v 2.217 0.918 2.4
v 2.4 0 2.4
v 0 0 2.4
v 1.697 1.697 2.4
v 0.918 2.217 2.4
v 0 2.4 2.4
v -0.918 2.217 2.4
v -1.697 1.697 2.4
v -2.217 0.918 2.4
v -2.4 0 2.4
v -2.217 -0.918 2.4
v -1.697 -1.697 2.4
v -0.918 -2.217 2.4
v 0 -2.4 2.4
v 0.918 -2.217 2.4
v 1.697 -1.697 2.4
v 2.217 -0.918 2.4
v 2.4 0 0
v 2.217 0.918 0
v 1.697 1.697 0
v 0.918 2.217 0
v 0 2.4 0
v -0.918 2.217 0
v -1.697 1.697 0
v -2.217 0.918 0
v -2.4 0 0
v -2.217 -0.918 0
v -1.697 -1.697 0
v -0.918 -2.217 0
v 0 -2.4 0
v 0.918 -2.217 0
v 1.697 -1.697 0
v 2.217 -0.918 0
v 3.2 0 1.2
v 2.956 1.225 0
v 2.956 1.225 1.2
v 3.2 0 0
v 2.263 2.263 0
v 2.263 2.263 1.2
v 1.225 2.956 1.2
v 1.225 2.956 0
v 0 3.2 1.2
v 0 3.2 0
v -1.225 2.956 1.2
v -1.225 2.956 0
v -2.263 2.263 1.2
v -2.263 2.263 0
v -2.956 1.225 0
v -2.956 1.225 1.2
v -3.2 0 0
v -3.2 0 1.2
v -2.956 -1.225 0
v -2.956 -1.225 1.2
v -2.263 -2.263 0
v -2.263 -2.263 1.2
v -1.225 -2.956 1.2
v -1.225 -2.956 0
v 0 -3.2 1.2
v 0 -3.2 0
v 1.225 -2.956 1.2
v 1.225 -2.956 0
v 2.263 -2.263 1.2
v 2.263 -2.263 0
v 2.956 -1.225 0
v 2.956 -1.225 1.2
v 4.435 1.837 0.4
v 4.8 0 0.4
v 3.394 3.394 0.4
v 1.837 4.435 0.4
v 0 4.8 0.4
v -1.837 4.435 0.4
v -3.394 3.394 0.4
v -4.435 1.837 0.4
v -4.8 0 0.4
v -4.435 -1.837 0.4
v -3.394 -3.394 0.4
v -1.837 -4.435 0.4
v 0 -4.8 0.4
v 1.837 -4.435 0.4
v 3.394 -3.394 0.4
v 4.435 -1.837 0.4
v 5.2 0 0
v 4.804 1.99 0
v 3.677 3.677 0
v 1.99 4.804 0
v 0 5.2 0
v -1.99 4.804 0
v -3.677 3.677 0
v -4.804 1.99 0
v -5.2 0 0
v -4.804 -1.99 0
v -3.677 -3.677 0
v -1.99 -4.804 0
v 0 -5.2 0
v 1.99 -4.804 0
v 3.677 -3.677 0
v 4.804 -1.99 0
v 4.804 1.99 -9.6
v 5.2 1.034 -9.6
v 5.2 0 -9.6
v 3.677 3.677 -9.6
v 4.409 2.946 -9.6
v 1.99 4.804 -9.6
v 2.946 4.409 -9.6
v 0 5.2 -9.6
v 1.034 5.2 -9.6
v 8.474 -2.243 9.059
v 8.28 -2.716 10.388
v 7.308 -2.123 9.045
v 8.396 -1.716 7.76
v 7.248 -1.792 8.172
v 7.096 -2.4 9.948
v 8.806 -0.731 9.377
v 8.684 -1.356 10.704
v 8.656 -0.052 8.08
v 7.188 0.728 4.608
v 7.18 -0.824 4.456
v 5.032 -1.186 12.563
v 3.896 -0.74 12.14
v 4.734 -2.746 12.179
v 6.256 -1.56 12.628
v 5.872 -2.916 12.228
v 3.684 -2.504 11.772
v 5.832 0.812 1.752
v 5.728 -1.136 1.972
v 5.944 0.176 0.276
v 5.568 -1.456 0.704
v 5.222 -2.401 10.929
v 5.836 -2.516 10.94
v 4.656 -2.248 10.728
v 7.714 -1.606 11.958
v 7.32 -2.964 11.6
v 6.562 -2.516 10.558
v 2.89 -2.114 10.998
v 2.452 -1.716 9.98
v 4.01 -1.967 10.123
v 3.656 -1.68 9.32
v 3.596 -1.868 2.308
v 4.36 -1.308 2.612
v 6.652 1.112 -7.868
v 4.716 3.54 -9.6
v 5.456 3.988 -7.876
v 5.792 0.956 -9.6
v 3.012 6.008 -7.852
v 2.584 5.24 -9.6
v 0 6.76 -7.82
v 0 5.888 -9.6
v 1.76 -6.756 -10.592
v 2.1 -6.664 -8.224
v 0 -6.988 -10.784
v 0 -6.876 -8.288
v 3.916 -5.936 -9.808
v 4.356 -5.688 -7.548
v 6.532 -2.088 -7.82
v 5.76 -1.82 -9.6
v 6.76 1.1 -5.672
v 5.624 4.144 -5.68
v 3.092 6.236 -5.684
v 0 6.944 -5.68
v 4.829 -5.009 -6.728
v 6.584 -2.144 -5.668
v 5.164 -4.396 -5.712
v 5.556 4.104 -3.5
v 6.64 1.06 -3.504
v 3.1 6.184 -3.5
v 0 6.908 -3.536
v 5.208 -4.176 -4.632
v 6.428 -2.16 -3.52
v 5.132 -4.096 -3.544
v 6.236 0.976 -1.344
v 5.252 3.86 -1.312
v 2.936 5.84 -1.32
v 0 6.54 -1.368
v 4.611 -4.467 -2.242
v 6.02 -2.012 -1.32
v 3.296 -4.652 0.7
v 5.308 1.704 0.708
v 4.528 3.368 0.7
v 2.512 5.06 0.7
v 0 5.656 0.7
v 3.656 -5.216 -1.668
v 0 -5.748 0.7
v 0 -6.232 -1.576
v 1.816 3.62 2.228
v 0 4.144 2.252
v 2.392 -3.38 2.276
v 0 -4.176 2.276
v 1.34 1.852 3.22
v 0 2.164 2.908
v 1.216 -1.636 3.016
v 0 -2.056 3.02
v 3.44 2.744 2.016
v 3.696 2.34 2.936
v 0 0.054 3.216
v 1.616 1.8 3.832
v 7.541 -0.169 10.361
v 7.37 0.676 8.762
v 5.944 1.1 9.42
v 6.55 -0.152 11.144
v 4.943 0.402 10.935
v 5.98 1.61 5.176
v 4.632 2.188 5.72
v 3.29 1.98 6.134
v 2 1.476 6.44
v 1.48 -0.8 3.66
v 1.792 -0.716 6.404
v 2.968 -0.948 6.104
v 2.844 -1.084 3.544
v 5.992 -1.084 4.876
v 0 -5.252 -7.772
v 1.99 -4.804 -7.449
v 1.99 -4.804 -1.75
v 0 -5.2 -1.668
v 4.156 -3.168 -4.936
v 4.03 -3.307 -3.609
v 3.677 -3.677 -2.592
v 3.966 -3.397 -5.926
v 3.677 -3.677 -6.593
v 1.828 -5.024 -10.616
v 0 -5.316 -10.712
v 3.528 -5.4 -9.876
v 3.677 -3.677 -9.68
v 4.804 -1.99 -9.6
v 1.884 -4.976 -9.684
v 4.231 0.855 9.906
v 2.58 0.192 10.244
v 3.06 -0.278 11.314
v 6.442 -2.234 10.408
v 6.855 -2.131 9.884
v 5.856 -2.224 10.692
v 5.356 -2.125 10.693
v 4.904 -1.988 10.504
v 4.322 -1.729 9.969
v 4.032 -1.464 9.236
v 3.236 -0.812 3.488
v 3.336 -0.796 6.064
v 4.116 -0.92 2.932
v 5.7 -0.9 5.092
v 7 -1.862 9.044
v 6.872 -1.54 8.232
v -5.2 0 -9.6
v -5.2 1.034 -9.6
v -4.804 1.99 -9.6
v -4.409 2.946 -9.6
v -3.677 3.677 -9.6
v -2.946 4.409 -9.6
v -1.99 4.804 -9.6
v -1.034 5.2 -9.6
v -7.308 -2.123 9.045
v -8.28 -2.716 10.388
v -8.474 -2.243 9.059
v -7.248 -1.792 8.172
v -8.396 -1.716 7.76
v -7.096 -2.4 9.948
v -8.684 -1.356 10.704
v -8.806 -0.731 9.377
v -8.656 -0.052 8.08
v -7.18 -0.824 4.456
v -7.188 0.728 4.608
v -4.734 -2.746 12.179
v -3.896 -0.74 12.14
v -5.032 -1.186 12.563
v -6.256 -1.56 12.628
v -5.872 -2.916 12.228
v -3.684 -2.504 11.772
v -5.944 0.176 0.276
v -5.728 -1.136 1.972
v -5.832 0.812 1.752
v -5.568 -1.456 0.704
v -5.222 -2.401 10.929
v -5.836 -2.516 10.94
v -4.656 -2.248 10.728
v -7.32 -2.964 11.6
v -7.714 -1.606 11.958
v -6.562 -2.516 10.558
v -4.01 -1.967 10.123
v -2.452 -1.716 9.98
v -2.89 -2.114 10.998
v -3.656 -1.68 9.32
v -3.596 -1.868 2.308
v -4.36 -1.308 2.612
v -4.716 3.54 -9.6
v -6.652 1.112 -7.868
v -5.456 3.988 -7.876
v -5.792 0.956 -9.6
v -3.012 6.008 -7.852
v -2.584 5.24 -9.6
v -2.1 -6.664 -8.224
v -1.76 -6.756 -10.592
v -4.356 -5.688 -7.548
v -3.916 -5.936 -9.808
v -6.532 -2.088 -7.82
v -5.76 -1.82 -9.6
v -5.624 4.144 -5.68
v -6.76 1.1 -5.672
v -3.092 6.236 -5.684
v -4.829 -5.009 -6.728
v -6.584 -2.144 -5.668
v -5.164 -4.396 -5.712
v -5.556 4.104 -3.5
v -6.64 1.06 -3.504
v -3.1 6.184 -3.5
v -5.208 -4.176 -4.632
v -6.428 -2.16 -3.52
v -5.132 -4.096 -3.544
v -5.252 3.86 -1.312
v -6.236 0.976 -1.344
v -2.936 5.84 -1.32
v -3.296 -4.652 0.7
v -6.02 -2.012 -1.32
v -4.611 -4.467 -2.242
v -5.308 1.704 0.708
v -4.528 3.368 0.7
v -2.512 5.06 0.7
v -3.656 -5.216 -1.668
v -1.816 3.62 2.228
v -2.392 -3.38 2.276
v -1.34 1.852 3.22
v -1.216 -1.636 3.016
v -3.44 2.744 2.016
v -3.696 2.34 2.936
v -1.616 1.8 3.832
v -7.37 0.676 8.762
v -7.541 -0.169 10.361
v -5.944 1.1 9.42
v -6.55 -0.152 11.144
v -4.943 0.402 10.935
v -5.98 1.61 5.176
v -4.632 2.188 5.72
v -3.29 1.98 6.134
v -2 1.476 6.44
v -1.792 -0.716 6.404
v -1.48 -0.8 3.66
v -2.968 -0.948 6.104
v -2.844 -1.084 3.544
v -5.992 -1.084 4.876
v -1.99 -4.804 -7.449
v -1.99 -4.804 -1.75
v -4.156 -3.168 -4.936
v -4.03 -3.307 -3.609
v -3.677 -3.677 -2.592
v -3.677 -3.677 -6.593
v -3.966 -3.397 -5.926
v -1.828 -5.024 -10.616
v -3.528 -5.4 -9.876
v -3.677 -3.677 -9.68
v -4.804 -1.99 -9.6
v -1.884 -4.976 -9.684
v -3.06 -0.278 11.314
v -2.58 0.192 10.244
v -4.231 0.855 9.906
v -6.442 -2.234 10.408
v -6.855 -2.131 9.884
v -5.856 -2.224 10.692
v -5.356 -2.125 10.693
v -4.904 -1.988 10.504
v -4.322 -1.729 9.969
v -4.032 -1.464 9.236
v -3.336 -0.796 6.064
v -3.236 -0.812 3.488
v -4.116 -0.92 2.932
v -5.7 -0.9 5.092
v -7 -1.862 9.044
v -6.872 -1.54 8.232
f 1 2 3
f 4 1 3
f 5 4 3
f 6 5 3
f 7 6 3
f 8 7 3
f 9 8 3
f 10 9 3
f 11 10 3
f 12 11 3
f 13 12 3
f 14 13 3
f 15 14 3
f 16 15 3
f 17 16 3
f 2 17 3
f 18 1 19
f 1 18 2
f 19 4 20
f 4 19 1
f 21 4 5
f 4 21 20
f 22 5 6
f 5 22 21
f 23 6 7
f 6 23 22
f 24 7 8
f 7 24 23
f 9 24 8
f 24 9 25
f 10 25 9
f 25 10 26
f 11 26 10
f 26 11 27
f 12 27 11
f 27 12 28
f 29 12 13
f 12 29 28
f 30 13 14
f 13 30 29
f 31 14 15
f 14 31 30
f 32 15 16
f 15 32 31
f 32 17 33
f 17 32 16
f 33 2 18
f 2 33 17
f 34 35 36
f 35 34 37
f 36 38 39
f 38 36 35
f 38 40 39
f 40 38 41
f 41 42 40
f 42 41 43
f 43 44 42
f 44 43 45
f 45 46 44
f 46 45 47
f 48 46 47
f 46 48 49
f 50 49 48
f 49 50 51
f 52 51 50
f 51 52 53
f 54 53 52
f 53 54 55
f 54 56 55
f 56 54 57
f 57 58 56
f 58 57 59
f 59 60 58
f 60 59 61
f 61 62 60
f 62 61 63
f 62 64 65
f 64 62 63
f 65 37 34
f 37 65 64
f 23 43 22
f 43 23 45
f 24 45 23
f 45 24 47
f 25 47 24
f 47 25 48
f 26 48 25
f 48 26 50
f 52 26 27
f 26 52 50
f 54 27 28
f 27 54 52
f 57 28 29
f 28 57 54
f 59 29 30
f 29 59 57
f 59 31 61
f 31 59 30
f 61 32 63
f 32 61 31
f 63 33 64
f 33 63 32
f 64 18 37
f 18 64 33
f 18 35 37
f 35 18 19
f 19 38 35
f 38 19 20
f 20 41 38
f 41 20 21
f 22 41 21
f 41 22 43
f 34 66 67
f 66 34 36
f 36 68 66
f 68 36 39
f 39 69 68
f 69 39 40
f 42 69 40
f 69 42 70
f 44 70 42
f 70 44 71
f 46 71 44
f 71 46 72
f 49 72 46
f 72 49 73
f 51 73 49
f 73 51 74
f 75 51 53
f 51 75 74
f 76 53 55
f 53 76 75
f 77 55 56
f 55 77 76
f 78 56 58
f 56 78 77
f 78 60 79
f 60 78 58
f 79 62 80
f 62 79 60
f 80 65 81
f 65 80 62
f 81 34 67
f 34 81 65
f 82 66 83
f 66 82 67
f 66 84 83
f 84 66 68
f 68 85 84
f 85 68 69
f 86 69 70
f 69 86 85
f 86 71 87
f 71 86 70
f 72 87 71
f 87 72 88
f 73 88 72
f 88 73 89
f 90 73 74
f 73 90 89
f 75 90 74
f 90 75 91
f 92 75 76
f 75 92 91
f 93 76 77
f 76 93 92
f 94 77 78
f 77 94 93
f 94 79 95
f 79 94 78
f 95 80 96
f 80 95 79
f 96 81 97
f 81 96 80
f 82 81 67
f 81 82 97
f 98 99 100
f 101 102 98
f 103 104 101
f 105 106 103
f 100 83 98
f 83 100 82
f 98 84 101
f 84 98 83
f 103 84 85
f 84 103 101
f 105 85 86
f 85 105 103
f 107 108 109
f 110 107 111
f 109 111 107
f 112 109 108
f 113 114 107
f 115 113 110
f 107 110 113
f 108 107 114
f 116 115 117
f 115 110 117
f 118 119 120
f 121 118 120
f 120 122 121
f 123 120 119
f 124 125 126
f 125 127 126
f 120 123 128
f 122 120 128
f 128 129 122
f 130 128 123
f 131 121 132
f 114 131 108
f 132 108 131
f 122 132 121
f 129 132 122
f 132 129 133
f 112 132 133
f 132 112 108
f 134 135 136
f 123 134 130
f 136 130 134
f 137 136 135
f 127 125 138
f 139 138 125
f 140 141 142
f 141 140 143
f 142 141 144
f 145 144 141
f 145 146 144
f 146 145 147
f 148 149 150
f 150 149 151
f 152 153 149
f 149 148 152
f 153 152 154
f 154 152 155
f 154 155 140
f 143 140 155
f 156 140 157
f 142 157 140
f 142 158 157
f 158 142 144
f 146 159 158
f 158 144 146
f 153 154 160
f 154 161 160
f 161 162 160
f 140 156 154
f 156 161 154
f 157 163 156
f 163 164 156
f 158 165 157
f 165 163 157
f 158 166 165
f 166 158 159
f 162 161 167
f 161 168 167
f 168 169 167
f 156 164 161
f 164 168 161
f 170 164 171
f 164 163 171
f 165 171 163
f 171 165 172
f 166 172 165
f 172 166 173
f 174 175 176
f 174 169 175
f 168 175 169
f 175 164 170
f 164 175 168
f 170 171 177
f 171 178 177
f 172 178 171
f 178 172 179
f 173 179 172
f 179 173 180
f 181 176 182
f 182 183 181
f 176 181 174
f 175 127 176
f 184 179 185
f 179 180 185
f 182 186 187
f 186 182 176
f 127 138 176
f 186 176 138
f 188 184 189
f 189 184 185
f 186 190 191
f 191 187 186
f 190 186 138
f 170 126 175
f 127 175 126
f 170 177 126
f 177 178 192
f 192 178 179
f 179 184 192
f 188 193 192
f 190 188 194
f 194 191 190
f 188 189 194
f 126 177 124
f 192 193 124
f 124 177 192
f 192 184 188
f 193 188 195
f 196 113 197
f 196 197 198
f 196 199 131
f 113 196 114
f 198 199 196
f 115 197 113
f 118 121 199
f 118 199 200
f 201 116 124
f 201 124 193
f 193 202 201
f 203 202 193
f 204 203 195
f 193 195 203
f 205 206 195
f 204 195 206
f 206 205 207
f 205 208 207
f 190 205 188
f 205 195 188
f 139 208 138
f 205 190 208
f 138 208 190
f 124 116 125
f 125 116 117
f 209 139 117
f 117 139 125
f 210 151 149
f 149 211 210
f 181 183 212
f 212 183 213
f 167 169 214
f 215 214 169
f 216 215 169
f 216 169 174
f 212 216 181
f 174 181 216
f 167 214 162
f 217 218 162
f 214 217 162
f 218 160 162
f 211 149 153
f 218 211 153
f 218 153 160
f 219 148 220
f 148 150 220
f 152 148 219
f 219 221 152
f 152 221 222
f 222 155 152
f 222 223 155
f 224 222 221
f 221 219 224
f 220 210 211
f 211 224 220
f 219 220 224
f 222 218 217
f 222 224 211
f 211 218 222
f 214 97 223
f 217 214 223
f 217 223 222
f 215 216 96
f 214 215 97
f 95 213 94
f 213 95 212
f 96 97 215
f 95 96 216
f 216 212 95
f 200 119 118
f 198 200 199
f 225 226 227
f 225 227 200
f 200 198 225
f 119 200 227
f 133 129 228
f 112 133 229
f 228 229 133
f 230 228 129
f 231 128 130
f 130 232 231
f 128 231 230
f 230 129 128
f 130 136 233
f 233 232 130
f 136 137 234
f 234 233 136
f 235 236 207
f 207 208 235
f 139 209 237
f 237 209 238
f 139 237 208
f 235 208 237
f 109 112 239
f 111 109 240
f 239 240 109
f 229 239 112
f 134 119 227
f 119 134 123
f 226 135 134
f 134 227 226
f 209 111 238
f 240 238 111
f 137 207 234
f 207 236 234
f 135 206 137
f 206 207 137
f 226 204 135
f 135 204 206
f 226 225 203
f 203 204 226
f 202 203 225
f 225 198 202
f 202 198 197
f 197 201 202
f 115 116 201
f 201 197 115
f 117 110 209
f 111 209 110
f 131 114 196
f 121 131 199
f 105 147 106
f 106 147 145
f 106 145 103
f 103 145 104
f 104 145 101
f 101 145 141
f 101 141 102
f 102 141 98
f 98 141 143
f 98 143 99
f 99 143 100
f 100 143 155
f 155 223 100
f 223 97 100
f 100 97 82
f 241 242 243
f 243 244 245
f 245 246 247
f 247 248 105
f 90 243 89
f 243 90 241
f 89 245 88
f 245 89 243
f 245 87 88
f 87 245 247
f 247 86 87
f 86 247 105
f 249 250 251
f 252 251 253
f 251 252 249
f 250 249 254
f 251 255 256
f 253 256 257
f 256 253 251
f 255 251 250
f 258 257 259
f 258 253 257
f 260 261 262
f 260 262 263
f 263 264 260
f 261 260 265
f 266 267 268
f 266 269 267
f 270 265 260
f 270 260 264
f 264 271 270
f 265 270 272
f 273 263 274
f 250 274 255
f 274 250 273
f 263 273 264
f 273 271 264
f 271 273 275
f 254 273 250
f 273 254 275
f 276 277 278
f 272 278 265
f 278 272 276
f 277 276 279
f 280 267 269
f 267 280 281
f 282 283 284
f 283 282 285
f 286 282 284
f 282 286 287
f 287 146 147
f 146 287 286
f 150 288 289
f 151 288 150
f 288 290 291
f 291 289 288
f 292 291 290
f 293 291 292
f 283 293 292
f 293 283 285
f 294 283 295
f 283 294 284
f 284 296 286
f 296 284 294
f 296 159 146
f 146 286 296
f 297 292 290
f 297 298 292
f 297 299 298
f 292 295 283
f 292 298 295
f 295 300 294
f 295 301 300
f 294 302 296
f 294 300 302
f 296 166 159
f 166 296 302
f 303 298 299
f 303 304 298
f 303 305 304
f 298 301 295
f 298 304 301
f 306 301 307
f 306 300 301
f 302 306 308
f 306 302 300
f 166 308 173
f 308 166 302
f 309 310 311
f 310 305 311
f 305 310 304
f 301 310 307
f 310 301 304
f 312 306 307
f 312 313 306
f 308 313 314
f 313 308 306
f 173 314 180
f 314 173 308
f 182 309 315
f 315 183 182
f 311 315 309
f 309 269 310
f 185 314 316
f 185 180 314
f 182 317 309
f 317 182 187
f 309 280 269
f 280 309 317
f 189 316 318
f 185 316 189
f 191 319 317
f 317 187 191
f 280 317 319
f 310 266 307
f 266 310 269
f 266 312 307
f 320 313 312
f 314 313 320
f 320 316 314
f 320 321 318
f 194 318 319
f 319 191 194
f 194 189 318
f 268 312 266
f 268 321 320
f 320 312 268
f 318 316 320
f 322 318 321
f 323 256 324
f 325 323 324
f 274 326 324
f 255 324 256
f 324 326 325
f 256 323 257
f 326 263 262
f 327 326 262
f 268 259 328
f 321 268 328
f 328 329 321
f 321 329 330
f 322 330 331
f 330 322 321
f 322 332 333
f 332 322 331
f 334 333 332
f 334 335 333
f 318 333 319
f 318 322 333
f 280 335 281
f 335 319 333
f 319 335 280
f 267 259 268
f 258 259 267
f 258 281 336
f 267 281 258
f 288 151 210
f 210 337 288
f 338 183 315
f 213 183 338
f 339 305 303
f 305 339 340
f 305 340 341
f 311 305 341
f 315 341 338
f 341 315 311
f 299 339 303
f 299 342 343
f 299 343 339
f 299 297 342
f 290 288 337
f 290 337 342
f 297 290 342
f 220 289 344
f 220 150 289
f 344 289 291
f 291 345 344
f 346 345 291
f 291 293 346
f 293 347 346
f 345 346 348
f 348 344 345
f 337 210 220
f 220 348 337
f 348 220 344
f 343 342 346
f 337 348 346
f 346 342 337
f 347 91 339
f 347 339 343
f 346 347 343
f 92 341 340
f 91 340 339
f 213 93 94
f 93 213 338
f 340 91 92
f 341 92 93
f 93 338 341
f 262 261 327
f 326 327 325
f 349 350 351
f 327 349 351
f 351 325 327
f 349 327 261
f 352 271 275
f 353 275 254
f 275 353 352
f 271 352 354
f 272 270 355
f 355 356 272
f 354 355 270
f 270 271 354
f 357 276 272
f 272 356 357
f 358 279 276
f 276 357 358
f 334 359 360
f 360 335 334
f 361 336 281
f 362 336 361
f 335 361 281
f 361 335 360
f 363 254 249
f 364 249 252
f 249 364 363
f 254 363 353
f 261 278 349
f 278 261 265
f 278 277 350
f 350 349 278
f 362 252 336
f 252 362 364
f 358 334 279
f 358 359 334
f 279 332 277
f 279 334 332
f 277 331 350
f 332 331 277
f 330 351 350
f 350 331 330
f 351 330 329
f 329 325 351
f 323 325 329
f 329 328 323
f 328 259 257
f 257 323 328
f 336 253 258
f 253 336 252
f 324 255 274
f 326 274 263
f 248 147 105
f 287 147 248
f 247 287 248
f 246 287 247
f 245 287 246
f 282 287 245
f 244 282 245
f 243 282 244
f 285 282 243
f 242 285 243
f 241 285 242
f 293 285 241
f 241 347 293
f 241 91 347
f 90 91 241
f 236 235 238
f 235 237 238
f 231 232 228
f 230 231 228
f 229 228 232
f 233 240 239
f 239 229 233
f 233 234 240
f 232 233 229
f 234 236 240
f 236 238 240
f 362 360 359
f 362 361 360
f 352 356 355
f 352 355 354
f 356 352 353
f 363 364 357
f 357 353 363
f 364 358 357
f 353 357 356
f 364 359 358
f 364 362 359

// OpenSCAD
use <../lib.scad>
use <../p/4-4con12.scad>
use <../p/4-4con2.scad>
use <../p/4-4disc.scad>
use <s/99244s01.scad>
use <s/99244s02.scad>
use <../p/stud4h.scad>
function ldraw_lib__99244p02() = [
// 0 Minifig Headdress Rabbit with Dark Tan Inner Ear Pattern
// 0 Name: 99244p02.dat
// 0 Author: Gerald Lasser [GeraldLasser]
// 0 !LDRAW_ORG Part UPDATE 2023-04
// 0 !LICENSE Licensed under CC BY 4.0 : see CAreadme.txt
// 
// 0 BFC CERTIFY CCW
  [0,"BFC","CERTIFY"],
  [0,"BFC","CCW"],
// 
// 0 !CATEGORY Minifig Headwear
// 0 !KEYWORDS Bricklink 99244pb02, Bunny, Collectible Minifigures, Costume, Ears
// 0 !KEYWORDS March Harriet, mask, Rebrickable 99244pr0002, set 71017
// 0 !KEYWORDS The Lego Batman Movie
// 
// 0 !HISTORY 2023-08-25 [OrionP] Official Update 2023-04
// 
// 
// 1 16 0 -6 0 6 0 0 0 -1 0 0 0 6 4-4disc.dat
  [1,16,0,-6,0,6,0,0,0,-1,0,0,0,6, ldraw_lib__4_4disc()],
// 1 16 0 -3 0 1 0 0 0 -.75 0 0 0 1 stud4h.dat
  [1,16,0,-3,0,1,0,0,0,-.75,0,0,0,1, ldraw_lib__stud4h()],
// 0 BFC INVERTNEXT
  [0,"BFC","INVERTNEXT"],
// 1 16 0 -1 0 4 0 0 0 -2 0 0 0 4 4-4con2.dat
  [1,16,0,-1,0,4,0,0,0,-2,0,0,0,4, ldraw_lib__4_4con2()],
// 0 BFC INVERTNEXT
  [0,"BFC","INVERTNEXT"],
// 1 16 0 0 0 1 0 0 0 -1 0 0 0 1 4-4con12.dat
  [1,16,0,0,0,1,0,0,0,-1,0,0,0,1, ldraw_lib__4_4con12()],
// 
// 1 16 0 0 0 1 0 0 0 1 0 0 0 1 s\99244s01.dat
  [1,16,0,0,0,1,0,0,0,1,0,0,0,1, ldraw_lib__s__99244s01()],
// 1 16 0 0 0 -1 0 0 0 1 0 0 0 1 s\99244s01.dat
  [1,16,0,0,0,-1,0,0,0,1,0,0,0,1, ldraw_lib__s__99244s01()],
// 
// 1 28 0 0 0 1 0 0 0 1 0 0 0 1 s\99244s02.dat
  [1,28,0,0,0,1,0,0,0,1,0,0,0,1, ldraw_lib__s__99244s02()],
// 1 28 0 0 0 -1 0 0 0 1 0 0 0 1 s\99244s02.dat
  [1,28,0,0,0,-1,0,0,0,1,0,0,0,1, ldraw_lib__s__99244s02()],
// 
// 5 24 0 8.84 17.27 0 3.42 16.35 -7.34 3.3 14.6 7.34 3.3 14.6
  [5,24,0,8.84,17.27,0,3.42,16.35,-7.34,3.3,14.6,7.34,3.3,14.6],
// 5 24 0 3.94 -15.58 0 4.17 -13 4.9751 4.3745 -12.0107 -4.9751 4.3745 -12.0107
  [5,24,0,3.94,-15.58,0,4.17,-13,4.9751,4.3745,-12.0107,-4.9751,4.3745,-12.0107],
// 5 24 0 19.43 -13.13 0 20.72 -17.19 5.25 20.56 -16.66 -5.25 20.56 -16.66
  [5,24,0,19.43,-13.13,0,20.72,-17.19,5.25,20.56,-16.66,-5.25,20.56,-16.66],
// 5 24 0 -7.55 -5.14 0 -5.69 -10.44 5.98 -5.69 -8.45 -5.98 -5.69 -8.45
  [5,24,0,-7.55,-5.14,0,-5.69,-10.44,5.98,-5.69,-8.45,-5.98,-5.69,-8.45],
// 5 24 0 24 14.72 0 19.55 16.9 -7.53 19.63 15.02 7.53 19.63 15.02
  [5,24,0,24,14.72,0,19.55,16.9,-7.53,19.63,15.02,7.53,19.63,15.02],
// 5 24 0 -7.27 5.41 0 -8.04 .135 3.35 -8.05 4.63 -3.35 -8.05 4.63
  [5,24,0,-7.27,5.41,0,-8.04,.135,3.35,-8.05,4.63,-3.35,-8.05,4.63],
// 5 24 0 -5.63 10.36 0 -7.27 5.41 4.54 -5.57 9.05 -4.54 -5.57 9.05
  [5,24,0,-5.63,10.36,0,-7.27,5.41,4.54,-5.57,9.05,-4.54,-5.57,9.05],
// 5 24 0 20.72 -17.19 0 26.96 -17.47 -5.25 20.56 -16.66 5.25 20.56 -16.66
  [5,24,0,20.72,-17.19,0,26.96,-17.47,-5.25,20.56,-16.66,5.25,20.56,-16.66],
// 5 24 0 19.55 16.9 0 14.2 17.36 -7.53 19.63 15.02 7.53 19.63 15.02
  [5,24,0,19.55,16.9,0,14.2,17.36,-7.53,19.63,15.02,7.53,19.63,15.02],
// 5 24 0 -8.04 .135 0 -7.55 -5.14 3.04 -7.54 -4.09 -3.04 -7.54 -4.09
  [5,24,0,-8.04,.135,0,-7.55,-5.14,3.04,-7.54,-4.09,-3.04,-7.54,-4.09],
// 5 24 0 4.17 -13 0 0 -13 -4.9751 0 -12.0107 4.9751 0 -12.0107
  [5,24,0,4.17,-13,0,0,-13,-4.9751,0,-12.0107,4.9751,0,-12.0107],
// 5 24 0 3.42 16.35 0 -1.75 14.14 -6.28 -1.75 12.65 6.28 -1.75 12.65
  [5,24,0,3.42,16.35,0,-1.75,14.14,-6.28,-1.75,12.65,6.28,-1.75,12.65],
// 5 24 0 -1.75 14.14 0 -5.63 10.36 -6.28 -1.75 12.65 6.28 -1.75 12.65
  [5,24,0,-1.75,14.14,0,-5.63,10.36,-6.28,-1.75,12.65,6.28,-1.75,12.65],
// 5 24 0 26.78 -13.29 0 19.43 -13.13 4.9751 18.623 -12.0107 -4.9751 18.623 -12.0107
  [5,24,0,26.78,-13.29,0,19.43,-13.13,4.9751,18.623,-12.0107,-4.9751,18.623,-12.0107],
// 5 24 0 -5.69 -10.44 0 -1.75 -14.37 -8.24 -1.75 -11.63 8.24 -1.75 -11.63
  [5,24,0,-5.69,-10.44,0,-1.75,-14.37,-8.24,-1.75,-11.63,8.24,-1.75,-11.63],
// 5 24 0 -1.75 -14.37 0 3.94 -15.58 -9.14 4.17 -13.04 9.14 4.17 -13.04
  [5,24,0,-1.75,-14.37,0,3.94,-15.58,-9.14,4.17,-13.04,9.14,4.17,-13.04],
// 5 24 0 14.2 17.36 0 8.84 17.27 7.75 8.75 15.46 -7.75 8.75 15.46
  [5,24,0,14.2,17.36,0,8.84,17.27,7.75,8.75,15.46,-7.75,8.75,15.46],
// 5 24 0 26.96 -17.47 0 26.78 -13.29 4.4 26.48 -16.89 -4.4 26.48 -16.89
  [5,24,0,26.96,-17.47,0,26.78,-13.29,4.4,26.48,-16.89,-4.4,26.48,-16.89],
];
module ldraw_lib__99244p02(step=0, col=false, unit=2/5, alt=false, line=0.2, solid=!$preview)
    makepoly(ldraw_lib__99244p02(), step=step, col=col, unit=unit, alt=alt, line=line, solid=solid);
ldraw_lib__99244p02(line=0.2);
